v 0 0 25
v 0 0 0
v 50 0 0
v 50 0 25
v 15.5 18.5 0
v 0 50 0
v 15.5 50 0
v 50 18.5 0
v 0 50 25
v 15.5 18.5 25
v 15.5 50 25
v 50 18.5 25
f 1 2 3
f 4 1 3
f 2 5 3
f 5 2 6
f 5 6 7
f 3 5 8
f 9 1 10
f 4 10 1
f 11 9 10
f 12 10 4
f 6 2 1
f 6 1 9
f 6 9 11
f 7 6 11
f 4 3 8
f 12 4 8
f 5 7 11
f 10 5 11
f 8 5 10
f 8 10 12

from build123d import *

# Parameters (mm, degrees)
SKETCH1_W           = 50
SKETCH1_H           = 18.5
BOSS_EXTRUDE1_DEPTH = 25
SKETCH2_W           = 15.5
SKETCH2_H           = 25
BOSS_EXTRUDE2_DEPTH = 50


with BuildPart() as part:
    # Sketch1 → Boss-Extrude1 (new body)
    with BuildSketch(Plane.XY):
        with Locations((25, 9.25)):
            Rectangle(SKETCH1_W, SKETCH1_H)
    extrude(amount=BOSS_EXTRUDE1_DEPTH)

    # Sketch2 → Boss-Extrude2 (add)
    with BuildSketch(Plane.XZ):
        with Locations((7.75, 12.5)):
            Rectangle(SKETCH2_W, SKETCH2_H)
    extrude(amount=-BOSS_EXTRUDE2_DEPTH)


solid = part.part
